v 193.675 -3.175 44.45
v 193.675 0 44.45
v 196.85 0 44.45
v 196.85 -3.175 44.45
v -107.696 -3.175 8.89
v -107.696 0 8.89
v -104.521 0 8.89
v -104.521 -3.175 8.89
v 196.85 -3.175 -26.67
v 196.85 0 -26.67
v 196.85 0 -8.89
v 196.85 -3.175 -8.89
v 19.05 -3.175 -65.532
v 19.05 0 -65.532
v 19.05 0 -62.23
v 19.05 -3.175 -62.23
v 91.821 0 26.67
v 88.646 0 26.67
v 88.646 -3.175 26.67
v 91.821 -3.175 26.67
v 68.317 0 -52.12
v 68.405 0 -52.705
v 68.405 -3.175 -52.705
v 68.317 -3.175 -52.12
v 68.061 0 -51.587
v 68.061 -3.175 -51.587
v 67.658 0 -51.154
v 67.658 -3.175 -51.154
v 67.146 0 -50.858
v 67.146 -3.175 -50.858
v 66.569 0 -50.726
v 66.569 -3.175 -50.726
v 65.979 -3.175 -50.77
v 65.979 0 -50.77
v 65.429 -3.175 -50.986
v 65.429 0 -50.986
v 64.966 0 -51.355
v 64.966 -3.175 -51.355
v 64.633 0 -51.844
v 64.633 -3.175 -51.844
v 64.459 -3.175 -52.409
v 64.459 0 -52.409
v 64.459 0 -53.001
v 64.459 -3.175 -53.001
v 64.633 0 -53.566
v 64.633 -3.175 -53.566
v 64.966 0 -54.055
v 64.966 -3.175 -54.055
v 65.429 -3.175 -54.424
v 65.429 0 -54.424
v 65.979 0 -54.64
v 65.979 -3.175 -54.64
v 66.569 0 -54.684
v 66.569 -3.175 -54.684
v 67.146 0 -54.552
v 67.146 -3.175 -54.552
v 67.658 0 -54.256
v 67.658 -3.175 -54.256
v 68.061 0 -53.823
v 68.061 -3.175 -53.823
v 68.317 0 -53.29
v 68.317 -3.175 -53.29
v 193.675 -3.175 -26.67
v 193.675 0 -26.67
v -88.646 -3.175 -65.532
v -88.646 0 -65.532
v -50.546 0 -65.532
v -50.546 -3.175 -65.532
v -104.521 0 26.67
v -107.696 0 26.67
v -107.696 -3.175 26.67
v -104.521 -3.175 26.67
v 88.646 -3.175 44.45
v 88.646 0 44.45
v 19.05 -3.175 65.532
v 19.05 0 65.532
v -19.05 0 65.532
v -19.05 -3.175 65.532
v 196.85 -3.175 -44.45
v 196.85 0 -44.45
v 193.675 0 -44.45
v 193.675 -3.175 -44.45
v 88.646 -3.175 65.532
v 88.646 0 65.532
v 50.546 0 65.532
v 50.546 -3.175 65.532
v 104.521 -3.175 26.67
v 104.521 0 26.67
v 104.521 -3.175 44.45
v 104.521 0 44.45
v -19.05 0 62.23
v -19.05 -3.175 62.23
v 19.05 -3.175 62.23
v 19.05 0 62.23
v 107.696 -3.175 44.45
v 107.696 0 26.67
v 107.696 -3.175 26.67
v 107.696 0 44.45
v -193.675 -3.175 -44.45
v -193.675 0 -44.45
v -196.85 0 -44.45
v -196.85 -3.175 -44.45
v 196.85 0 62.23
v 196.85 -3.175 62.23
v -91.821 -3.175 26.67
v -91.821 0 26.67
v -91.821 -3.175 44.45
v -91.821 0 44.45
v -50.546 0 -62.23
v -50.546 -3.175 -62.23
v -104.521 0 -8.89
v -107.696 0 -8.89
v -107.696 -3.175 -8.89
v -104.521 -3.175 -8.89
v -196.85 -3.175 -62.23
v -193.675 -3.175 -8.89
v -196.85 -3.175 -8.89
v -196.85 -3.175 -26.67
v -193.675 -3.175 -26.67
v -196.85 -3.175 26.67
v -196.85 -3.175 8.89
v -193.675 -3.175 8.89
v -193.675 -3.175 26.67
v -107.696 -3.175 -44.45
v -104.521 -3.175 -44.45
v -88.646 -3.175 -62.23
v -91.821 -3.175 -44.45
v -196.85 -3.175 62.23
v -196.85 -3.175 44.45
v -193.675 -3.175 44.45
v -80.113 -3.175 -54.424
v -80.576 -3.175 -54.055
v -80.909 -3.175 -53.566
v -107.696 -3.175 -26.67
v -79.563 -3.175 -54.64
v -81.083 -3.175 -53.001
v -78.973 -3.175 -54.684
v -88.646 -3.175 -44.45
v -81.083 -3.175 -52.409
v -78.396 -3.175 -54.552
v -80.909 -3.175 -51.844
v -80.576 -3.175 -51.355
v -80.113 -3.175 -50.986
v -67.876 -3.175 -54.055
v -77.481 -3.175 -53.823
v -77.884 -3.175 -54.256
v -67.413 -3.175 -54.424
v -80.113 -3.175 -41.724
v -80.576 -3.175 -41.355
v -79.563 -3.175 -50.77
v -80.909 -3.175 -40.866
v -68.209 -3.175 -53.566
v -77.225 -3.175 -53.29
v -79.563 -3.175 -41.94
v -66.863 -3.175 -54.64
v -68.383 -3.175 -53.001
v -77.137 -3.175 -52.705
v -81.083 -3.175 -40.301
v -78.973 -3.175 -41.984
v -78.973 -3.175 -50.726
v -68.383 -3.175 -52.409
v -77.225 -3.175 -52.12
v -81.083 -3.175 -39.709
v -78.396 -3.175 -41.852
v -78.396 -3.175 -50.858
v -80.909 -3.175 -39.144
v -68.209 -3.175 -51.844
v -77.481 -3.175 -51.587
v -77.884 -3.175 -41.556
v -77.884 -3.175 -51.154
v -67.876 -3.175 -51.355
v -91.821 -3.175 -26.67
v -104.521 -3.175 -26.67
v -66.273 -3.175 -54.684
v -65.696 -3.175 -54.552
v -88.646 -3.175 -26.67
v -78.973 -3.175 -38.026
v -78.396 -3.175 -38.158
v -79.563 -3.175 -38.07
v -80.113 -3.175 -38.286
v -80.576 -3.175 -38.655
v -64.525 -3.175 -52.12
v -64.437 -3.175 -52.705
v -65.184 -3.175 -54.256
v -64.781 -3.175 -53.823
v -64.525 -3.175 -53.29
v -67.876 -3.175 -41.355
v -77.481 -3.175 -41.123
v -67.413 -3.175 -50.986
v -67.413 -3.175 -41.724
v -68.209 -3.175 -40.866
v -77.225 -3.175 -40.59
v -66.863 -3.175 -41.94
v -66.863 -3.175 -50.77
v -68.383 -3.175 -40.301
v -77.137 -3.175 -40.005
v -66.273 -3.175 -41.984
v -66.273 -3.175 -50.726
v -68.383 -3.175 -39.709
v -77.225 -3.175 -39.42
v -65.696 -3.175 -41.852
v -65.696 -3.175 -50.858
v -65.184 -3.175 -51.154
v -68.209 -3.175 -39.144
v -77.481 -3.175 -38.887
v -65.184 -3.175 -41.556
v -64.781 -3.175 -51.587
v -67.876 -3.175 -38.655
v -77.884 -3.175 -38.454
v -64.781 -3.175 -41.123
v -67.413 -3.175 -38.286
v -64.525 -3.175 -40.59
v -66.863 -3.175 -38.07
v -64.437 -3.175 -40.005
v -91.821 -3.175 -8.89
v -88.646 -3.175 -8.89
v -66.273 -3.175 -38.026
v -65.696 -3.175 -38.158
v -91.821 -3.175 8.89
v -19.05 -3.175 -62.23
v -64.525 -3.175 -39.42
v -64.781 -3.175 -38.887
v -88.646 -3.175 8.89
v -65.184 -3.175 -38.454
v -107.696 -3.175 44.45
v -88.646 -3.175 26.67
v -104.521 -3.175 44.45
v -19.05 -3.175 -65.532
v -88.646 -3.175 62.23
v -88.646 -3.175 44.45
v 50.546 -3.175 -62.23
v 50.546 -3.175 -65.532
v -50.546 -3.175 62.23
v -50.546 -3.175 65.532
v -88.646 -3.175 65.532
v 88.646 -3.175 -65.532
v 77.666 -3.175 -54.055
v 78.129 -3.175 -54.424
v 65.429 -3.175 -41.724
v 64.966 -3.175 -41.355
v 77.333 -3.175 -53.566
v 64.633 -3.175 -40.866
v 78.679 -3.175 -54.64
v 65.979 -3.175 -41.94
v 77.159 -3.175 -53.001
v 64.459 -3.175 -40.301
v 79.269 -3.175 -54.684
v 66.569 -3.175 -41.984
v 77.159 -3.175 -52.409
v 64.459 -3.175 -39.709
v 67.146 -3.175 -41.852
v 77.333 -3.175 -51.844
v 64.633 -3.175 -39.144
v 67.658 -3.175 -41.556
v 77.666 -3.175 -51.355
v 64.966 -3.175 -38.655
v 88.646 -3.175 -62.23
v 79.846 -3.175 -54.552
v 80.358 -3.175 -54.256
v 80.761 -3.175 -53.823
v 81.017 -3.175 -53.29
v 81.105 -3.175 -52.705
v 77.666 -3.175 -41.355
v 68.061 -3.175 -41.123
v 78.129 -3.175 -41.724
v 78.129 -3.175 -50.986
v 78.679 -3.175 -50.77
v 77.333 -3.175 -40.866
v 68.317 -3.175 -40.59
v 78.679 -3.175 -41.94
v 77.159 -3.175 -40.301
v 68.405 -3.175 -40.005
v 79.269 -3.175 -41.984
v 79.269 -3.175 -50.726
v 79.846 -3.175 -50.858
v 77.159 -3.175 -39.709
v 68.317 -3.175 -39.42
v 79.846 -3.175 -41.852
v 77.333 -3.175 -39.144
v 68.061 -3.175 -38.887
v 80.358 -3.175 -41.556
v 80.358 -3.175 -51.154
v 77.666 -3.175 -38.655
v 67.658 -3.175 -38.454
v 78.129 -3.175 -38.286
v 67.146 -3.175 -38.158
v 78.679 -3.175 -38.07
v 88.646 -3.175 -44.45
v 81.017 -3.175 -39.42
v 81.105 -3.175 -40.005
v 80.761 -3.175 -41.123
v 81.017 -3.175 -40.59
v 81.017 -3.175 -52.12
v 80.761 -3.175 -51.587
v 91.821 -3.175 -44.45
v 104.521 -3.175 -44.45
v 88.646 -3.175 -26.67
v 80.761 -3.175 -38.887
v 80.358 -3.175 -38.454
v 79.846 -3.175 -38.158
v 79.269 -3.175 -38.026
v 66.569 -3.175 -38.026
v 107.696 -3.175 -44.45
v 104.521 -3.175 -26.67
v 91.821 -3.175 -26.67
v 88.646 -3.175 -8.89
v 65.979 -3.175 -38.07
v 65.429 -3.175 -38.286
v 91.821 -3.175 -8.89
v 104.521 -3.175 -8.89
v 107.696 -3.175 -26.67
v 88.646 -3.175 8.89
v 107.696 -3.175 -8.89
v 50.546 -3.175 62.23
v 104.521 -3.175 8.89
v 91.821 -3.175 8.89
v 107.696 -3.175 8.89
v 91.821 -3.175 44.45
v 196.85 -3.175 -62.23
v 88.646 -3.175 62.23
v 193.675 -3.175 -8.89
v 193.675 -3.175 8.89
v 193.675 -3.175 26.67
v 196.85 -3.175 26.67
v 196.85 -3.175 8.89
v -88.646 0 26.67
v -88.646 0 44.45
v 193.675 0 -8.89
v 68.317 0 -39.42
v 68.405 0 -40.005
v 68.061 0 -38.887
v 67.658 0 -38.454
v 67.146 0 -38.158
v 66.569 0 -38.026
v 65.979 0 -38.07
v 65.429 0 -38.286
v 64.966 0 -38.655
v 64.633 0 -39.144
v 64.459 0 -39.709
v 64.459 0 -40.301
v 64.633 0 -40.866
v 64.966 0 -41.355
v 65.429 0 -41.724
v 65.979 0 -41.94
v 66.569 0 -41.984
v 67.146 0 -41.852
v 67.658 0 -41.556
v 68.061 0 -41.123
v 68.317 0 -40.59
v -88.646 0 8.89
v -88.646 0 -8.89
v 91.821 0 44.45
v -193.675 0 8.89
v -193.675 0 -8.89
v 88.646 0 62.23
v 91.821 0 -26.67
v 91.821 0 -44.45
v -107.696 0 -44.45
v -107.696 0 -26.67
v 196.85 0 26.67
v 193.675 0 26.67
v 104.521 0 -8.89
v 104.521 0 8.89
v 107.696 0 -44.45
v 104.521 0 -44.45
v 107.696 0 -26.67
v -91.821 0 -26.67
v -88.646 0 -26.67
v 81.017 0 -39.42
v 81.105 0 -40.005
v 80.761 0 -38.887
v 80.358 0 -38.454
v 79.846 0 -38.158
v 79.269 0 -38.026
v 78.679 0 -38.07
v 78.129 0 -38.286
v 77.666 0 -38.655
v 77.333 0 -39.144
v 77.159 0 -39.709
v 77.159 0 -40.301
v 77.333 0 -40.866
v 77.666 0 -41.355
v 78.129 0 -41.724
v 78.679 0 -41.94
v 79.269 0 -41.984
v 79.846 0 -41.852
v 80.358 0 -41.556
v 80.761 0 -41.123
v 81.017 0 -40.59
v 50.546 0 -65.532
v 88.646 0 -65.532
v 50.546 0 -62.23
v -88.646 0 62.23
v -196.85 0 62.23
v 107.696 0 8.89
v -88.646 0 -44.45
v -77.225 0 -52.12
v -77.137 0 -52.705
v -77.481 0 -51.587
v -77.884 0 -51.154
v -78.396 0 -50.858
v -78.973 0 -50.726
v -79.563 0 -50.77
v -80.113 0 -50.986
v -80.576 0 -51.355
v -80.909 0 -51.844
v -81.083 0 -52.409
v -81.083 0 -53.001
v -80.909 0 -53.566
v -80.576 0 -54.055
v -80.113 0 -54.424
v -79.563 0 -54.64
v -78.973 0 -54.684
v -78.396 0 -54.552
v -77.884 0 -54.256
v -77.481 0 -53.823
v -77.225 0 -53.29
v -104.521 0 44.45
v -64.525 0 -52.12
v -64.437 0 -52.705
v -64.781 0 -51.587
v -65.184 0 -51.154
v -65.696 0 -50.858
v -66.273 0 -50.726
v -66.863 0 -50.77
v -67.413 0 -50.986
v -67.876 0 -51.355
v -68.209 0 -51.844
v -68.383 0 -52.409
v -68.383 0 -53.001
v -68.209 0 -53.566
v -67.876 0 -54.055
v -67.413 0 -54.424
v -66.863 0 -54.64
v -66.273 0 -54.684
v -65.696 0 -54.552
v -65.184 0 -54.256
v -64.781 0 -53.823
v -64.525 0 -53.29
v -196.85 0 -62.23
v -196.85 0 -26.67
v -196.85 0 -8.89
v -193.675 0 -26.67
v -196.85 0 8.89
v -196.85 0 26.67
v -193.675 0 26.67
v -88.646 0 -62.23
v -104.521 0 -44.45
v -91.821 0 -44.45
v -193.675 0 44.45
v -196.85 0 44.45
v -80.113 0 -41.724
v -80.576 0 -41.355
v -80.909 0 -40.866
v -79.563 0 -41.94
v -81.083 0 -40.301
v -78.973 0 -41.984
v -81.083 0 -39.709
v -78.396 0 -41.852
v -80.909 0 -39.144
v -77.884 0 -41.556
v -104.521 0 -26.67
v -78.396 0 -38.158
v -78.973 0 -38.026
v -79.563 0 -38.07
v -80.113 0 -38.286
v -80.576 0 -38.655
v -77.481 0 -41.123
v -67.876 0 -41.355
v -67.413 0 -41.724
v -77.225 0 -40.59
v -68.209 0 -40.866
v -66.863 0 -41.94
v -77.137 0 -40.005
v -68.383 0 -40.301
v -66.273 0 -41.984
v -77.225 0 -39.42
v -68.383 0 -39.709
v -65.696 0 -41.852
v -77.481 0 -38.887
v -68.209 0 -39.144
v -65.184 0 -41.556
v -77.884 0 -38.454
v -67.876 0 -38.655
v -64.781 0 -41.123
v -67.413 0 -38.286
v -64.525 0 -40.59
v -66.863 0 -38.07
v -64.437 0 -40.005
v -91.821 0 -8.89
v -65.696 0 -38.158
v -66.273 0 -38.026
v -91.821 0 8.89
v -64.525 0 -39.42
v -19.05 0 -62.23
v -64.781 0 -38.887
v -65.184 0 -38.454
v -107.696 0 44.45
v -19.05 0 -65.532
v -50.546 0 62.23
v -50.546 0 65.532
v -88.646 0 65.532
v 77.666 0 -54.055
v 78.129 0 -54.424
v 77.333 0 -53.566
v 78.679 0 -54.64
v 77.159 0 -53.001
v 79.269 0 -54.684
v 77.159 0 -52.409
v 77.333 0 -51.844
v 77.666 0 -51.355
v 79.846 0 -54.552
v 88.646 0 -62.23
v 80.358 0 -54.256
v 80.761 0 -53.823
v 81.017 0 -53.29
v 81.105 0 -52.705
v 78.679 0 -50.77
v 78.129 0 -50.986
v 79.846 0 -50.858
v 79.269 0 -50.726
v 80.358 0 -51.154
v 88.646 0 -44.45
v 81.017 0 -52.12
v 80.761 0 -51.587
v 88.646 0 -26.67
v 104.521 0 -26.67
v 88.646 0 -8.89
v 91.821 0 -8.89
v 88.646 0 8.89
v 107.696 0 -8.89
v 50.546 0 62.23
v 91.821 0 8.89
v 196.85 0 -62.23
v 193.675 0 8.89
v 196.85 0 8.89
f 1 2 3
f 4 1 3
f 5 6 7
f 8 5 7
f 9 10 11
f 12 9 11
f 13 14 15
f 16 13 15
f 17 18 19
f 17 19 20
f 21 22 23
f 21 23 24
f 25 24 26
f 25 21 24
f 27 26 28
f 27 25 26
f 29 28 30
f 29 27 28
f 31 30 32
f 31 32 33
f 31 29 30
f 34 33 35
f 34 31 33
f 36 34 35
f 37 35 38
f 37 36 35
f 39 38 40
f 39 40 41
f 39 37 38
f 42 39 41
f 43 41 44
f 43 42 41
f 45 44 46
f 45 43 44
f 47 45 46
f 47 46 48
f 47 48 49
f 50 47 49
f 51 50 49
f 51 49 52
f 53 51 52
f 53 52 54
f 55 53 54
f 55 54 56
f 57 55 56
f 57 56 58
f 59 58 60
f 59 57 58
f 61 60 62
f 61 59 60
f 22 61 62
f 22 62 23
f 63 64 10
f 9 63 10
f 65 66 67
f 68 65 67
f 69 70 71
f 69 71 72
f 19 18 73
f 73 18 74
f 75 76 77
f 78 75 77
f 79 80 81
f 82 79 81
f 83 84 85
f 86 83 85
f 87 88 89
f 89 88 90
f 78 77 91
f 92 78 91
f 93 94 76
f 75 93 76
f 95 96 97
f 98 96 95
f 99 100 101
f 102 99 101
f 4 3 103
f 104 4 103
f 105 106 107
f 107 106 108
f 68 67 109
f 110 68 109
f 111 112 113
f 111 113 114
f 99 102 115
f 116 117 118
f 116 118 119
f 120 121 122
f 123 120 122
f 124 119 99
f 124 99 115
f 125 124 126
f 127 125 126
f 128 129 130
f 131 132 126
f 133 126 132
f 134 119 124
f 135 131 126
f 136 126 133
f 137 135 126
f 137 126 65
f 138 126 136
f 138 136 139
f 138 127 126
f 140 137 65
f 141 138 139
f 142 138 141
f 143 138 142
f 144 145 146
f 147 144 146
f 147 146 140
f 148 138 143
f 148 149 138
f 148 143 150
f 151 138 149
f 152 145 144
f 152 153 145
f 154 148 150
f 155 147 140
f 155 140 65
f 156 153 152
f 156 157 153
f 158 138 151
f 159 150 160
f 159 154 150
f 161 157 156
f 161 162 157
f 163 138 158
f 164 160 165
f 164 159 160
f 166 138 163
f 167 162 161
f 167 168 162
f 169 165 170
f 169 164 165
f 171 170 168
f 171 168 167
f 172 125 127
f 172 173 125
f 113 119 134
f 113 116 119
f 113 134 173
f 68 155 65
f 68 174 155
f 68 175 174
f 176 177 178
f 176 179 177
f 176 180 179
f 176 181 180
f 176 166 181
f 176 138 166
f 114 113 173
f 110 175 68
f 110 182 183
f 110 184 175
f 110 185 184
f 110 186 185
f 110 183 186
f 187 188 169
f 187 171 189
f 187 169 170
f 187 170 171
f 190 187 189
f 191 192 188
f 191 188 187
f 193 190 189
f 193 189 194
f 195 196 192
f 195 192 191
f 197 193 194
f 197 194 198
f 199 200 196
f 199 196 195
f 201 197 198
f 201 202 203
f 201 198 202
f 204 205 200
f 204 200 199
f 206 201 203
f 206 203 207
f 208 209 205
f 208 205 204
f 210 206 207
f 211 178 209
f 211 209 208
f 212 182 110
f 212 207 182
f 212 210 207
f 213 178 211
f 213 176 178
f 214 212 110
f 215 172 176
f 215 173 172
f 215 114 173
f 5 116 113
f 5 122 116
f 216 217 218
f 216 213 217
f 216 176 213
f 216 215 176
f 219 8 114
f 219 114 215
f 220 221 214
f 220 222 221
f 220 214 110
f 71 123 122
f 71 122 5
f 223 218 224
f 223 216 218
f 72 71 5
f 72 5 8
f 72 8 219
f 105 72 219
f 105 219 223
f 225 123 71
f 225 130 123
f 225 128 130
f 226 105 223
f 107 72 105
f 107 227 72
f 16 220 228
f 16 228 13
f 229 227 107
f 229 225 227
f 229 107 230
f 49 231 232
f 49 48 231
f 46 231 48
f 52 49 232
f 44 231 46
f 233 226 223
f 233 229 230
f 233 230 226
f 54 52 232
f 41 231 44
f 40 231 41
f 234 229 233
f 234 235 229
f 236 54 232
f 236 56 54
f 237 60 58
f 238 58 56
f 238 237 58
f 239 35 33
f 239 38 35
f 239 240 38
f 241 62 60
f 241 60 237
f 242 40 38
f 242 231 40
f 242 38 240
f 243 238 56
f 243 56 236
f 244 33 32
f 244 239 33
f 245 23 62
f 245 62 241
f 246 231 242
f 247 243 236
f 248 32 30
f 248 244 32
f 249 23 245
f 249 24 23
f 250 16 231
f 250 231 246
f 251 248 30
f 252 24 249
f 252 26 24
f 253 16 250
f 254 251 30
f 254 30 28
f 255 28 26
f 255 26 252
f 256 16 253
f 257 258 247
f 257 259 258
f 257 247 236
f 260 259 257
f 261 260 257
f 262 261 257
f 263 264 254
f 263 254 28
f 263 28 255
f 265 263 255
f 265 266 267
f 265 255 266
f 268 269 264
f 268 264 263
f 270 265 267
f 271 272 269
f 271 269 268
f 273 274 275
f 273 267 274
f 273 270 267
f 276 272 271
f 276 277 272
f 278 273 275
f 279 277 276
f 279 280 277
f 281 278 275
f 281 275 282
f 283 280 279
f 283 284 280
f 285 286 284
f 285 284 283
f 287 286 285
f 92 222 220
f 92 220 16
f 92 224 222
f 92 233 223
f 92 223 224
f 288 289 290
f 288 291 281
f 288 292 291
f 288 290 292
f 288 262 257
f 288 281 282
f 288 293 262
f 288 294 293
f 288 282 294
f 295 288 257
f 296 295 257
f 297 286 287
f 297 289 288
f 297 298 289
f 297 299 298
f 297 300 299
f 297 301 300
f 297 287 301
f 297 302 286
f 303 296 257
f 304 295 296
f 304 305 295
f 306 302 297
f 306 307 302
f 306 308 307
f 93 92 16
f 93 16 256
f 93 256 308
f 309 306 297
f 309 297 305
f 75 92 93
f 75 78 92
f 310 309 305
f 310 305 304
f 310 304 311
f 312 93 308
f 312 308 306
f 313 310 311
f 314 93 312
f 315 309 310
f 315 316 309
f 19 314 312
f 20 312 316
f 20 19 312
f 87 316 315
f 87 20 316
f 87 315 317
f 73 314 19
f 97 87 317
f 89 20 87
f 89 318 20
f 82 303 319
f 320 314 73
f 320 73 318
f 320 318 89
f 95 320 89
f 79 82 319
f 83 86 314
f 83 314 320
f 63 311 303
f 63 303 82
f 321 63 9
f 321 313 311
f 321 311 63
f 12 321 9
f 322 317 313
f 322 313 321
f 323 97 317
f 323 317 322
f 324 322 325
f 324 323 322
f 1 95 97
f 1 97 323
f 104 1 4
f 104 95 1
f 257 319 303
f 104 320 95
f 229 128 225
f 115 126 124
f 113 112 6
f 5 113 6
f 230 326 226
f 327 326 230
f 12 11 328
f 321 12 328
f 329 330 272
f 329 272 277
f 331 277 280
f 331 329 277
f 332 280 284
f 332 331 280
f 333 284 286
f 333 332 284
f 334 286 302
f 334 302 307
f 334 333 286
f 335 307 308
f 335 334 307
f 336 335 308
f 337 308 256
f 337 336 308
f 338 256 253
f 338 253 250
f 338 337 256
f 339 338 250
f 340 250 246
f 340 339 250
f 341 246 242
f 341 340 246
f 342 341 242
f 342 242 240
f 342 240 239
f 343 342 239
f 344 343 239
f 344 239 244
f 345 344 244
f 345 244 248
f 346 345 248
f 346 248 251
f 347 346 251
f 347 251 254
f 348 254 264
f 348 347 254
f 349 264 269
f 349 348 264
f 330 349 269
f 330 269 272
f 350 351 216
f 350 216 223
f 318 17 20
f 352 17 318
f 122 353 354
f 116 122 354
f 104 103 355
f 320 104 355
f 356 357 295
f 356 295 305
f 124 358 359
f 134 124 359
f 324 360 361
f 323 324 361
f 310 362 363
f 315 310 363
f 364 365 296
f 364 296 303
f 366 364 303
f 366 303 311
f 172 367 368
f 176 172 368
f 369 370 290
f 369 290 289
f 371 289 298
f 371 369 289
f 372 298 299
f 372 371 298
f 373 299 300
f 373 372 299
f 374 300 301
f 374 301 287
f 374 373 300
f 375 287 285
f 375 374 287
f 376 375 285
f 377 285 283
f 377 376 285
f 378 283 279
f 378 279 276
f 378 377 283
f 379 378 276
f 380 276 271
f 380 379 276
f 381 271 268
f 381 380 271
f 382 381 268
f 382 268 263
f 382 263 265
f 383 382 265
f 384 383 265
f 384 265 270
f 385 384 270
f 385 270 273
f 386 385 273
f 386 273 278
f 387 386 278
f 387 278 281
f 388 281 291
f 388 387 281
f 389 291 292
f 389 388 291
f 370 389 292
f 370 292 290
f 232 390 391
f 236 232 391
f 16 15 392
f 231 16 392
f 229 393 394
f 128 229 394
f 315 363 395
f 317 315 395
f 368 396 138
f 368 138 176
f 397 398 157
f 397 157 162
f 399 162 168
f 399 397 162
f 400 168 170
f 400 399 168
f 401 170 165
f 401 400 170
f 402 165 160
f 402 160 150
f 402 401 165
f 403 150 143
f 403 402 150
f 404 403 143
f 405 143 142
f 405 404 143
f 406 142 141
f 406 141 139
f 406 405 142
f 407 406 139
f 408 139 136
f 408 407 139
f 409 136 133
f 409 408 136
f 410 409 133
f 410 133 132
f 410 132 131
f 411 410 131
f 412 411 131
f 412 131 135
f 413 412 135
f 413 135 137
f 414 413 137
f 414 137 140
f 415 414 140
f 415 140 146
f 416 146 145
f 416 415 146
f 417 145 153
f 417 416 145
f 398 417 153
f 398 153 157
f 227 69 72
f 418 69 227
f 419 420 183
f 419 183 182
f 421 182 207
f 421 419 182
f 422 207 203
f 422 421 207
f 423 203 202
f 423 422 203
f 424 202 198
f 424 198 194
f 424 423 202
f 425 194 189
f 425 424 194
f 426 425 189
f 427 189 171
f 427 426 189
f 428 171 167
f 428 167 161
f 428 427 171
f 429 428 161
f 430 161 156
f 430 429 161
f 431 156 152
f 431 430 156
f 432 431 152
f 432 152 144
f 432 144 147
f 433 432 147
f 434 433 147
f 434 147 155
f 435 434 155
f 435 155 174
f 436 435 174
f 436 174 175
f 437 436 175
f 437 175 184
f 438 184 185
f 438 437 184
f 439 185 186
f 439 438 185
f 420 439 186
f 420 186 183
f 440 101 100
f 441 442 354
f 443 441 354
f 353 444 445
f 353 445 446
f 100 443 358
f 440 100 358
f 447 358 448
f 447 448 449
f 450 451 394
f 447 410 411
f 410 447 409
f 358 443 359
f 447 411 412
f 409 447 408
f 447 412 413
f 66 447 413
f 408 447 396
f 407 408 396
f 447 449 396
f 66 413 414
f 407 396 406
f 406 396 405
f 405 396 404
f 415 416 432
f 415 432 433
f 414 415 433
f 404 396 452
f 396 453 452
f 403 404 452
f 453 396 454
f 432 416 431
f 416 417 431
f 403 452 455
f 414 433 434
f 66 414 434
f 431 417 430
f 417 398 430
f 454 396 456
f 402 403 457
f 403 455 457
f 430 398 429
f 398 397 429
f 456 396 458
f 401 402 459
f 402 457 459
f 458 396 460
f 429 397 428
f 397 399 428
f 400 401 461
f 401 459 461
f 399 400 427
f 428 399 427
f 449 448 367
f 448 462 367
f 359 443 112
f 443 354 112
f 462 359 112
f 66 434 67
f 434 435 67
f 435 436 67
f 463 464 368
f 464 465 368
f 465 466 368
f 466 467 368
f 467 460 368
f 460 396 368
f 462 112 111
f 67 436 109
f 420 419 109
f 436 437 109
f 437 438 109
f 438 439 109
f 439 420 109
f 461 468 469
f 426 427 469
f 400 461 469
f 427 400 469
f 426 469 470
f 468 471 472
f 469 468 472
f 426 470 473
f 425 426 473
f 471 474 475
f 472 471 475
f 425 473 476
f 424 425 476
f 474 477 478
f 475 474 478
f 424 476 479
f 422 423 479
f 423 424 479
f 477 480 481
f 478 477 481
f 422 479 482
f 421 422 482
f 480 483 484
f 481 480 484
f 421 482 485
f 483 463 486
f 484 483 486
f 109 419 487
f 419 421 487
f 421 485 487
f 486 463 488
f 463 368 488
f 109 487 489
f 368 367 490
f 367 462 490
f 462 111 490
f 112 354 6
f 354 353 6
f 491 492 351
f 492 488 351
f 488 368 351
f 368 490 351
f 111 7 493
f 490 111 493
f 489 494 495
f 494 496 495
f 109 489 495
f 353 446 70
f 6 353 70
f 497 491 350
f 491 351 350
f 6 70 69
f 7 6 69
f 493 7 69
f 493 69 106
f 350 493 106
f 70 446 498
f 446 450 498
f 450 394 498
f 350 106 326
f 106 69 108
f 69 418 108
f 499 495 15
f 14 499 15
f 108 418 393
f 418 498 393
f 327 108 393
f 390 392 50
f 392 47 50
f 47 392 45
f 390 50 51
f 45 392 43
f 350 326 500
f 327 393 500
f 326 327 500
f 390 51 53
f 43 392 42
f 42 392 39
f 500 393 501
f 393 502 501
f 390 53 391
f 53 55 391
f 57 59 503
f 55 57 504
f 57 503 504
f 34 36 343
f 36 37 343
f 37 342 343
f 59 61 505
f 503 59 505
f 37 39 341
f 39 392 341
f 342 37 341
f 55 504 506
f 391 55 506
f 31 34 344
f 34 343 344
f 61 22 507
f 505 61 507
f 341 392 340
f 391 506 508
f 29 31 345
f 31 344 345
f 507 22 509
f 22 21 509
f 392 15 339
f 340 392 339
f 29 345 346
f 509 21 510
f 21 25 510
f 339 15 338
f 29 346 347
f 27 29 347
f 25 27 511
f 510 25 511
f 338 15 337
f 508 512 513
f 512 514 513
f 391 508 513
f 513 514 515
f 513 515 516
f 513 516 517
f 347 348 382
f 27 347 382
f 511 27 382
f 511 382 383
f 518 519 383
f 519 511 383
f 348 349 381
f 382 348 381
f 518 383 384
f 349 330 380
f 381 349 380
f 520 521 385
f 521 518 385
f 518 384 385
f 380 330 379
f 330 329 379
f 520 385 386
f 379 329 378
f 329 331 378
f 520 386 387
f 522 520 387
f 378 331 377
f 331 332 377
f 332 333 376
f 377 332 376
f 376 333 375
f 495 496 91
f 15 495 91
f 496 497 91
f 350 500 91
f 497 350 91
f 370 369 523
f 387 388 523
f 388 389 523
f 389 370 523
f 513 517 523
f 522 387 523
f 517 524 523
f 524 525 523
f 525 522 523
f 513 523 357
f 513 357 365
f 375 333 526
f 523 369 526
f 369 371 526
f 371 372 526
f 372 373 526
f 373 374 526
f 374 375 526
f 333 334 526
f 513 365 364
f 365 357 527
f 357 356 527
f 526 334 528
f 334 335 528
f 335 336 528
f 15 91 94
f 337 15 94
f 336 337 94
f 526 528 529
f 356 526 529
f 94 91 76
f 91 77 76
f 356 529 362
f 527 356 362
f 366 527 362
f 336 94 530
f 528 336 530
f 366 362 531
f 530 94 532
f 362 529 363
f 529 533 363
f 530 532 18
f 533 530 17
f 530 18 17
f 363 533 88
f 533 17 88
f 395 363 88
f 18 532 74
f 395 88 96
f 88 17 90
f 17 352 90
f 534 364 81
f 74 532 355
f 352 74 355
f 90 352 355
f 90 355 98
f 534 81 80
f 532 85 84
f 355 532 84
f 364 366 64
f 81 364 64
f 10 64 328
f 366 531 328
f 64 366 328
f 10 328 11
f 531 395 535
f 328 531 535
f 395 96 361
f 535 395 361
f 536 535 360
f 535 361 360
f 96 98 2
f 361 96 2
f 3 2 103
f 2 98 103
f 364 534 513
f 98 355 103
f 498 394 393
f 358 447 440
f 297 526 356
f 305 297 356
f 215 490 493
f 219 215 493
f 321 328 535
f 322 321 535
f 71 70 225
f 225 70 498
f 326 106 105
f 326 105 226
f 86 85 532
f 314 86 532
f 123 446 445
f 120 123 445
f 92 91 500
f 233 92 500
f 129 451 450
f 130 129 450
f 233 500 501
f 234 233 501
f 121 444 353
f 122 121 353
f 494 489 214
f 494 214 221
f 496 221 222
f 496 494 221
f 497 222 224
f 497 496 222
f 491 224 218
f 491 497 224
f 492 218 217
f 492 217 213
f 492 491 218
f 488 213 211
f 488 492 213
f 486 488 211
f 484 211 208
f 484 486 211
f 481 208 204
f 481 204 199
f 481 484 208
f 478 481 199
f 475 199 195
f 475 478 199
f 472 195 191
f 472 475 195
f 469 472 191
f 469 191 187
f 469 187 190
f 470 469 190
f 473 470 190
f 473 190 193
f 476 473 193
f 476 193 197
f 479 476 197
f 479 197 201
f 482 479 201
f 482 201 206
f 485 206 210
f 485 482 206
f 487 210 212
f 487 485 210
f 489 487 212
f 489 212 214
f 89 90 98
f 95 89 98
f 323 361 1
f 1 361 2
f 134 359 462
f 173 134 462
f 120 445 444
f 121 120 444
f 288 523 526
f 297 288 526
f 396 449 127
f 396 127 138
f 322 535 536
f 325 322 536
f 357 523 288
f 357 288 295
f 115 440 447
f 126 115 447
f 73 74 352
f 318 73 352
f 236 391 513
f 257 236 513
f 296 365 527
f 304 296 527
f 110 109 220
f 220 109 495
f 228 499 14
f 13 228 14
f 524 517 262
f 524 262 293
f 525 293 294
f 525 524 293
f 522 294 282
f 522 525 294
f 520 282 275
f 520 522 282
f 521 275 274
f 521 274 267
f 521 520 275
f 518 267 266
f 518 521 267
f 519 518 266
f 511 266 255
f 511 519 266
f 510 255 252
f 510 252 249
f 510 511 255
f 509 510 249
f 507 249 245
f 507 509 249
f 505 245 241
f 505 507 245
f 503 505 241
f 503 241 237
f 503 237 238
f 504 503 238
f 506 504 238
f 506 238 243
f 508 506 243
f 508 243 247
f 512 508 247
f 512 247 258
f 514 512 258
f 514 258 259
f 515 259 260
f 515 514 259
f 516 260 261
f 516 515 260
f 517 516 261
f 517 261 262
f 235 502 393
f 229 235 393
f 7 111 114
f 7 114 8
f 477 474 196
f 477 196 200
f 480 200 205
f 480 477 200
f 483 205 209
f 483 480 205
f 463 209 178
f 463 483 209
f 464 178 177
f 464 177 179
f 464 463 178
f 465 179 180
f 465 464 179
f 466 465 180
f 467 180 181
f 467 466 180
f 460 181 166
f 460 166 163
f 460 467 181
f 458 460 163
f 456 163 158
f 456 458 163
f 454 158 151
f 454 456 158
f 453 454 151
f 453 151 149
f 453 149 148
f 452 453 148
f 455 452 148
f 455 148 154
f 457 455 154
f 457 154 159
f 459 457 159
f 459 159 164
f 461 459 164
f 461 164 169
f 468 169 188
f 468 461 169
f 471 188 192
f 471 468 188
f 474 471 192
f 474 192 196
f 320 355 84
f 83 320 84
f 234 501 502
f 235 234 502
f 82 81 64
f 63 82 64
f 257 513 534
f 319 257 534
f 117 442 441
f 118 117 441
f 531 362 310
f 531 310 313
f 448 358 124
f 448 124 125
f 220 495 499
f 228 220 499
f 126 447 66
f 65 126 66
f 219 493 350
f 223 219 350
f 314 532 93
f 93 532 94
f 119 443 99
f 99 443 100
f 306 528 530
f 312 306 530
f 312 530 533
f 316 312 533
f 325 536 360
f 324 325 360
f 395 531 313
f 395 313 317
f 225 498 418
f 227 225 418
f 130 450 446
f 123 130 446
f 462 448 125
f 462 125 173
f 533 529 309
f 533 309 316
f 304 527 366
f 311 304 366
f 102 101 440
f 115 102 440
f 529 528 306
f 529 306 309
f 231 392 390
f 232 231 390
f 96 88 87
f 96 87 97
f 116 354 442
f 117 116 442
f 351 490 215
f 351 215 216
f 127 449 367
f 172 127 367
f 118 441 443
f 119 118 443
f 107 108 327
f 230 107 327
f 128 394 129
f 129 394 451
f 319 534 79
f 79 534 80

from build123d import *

# Parameters (mm, degrees)
F0_W     = 3.175
F0_H     = 17.78
F0_R     = 1.984375
F1_DEPTH = 3.175


with BuildPart() as f1:
    # F0 (on Front) → F1 (new body)
    with BuildSketch(Plane.XZ):
        Polygon((-88.646, -65.532), (-50.546, -65.532), (-50.546, -62.23), (-19.05, -62.23), (-19.05, -65.532), (19.05, -65.532), (19.05, -62.23), (50.546, -62.23), (50.546, -65.532), (88.646, -65.532), (88.646, -62.23), (107.696, -62.23), (196.85, -62.23), (196.85, -44.45), (193.675, -44.45), (193.675, -26.67), (196.85, -26.67), (196.85, -8.89), (193.675, -8.89), (193.675, 8.89), (196.85, 8.89), (196.85, 26.67), (193.675, 26.67), (193.675, 44.45), (196.85, 44.45), (196.85, 62.23), (107.696, 62.23), (88.646, 62.23), (88.646, 65.532), (50.546, 65.532), (50.546, 62.23), (19.05, 62.23), (19.05, 65.532), (-19.05, 65.532), (-19.05, 62.23), (-50.546, 62.23), (-50.546, 65.532), (-88.646, 65.532), (-88.646, 62.23), (-107.696, 62.23), (-196.85, 62.23), (-196.85, 44.45), (-193.675, 44.45), (-193.675, 26.67), (-196.85, 26.67), (-196.85, 8.89), (-193.675, 8.89), (-193.675, -8.89), (-196.85, -8.89), (-196.85, -26.67), (-193.675, -26.67), (-193.675, -44.45), (-196.85, -44.45), (-196.85, -62.23), (-107.696, -62.23), (-88.646, -62.23), align=None)
        with Locations((-106.1085, -35.56)):
            Rectangle(F0_W, F0_H, mode=Mode.SUBTRACT)
        with Locations((-79.121, -52.705)):
            Circle(F0_R, mode=Mode.SUBTRACT)
        with Locations((-66.421, -52.705)):
            Circle(F0_R, mode=Mode.SUBTRACT)
        with Locations((-79.121, -40.005)):
            Circle(F0_R, mode=Mode.SUBTRACT)
        with Locations((-90.2335, -35.56)):
            Rectangle(F0_W, F0_H, mode=Mode.SUBTRACT)
        with Locations((-66.421, -40.005)):
            Circle(F0_R, mode=Mode.SUBTRACT)
        with Locations((66.421, -52.705)):
            Circle(F0_R, mode=Mode.SUBTRACT)
        with Locations((79.121, -52.705)):
            Circle(F0_R, mode=Mode.SUBTRACT)
        with Locations((66.421, -40.005)):
            Circle(F0_R, mode=Mode.SUBTRACT)
        with Locations((79.121, -40.005)):
            Circle(F0_R, mode=Mode.SUBTRACT)
        with Locations((90.2335, -35.56)):
            Rectangle(F0_W, F0_H, mode=Mode.SUBTRACT)
        with Locations((106.1085, -35.56)):
            Rectangle(F0_W, F0_H, mode=Mode.SUBTRACT)
        with Locations((-106.1085, 0)):
            Rectangle(F0_W, F0_H, mode=Mode.SUBTRACT)
        with Locations((-90.2335, 0)):
            Rectangle(F0_W, F0_H, mode=Mode.SUBTRACT)
        with Locations((-106.1085, 35.56)):
            Rectangle(F0_W, F0_H, mode=Mode.SUBTRACT)
        with Locations((-90.2335, 35.56)):
            Rectangle(F0_W, F0_H, mode=Mode.SUBTRACT)
        with Locations((90.2335, 0)):
            Rectangle(F0_W, F0_H, mode=Mode.SUBTRACT)
        with Locations((106.1085, 0)):
            Rectangle(F0_W, F0_H, mode=Mode.SUBTRACT)
        with Locations((90.2335, 35.56)):
            Rectangle(F0_W, F0_H, mode=Mode.SUBTRACT)
        with Locations((106.1085, 35.56)):
            Rectangle(F0_W, F0_H, mode=Mode.SUBTRACT)
    extrude(amount=F1_DEPTH)


solid = f1.part
